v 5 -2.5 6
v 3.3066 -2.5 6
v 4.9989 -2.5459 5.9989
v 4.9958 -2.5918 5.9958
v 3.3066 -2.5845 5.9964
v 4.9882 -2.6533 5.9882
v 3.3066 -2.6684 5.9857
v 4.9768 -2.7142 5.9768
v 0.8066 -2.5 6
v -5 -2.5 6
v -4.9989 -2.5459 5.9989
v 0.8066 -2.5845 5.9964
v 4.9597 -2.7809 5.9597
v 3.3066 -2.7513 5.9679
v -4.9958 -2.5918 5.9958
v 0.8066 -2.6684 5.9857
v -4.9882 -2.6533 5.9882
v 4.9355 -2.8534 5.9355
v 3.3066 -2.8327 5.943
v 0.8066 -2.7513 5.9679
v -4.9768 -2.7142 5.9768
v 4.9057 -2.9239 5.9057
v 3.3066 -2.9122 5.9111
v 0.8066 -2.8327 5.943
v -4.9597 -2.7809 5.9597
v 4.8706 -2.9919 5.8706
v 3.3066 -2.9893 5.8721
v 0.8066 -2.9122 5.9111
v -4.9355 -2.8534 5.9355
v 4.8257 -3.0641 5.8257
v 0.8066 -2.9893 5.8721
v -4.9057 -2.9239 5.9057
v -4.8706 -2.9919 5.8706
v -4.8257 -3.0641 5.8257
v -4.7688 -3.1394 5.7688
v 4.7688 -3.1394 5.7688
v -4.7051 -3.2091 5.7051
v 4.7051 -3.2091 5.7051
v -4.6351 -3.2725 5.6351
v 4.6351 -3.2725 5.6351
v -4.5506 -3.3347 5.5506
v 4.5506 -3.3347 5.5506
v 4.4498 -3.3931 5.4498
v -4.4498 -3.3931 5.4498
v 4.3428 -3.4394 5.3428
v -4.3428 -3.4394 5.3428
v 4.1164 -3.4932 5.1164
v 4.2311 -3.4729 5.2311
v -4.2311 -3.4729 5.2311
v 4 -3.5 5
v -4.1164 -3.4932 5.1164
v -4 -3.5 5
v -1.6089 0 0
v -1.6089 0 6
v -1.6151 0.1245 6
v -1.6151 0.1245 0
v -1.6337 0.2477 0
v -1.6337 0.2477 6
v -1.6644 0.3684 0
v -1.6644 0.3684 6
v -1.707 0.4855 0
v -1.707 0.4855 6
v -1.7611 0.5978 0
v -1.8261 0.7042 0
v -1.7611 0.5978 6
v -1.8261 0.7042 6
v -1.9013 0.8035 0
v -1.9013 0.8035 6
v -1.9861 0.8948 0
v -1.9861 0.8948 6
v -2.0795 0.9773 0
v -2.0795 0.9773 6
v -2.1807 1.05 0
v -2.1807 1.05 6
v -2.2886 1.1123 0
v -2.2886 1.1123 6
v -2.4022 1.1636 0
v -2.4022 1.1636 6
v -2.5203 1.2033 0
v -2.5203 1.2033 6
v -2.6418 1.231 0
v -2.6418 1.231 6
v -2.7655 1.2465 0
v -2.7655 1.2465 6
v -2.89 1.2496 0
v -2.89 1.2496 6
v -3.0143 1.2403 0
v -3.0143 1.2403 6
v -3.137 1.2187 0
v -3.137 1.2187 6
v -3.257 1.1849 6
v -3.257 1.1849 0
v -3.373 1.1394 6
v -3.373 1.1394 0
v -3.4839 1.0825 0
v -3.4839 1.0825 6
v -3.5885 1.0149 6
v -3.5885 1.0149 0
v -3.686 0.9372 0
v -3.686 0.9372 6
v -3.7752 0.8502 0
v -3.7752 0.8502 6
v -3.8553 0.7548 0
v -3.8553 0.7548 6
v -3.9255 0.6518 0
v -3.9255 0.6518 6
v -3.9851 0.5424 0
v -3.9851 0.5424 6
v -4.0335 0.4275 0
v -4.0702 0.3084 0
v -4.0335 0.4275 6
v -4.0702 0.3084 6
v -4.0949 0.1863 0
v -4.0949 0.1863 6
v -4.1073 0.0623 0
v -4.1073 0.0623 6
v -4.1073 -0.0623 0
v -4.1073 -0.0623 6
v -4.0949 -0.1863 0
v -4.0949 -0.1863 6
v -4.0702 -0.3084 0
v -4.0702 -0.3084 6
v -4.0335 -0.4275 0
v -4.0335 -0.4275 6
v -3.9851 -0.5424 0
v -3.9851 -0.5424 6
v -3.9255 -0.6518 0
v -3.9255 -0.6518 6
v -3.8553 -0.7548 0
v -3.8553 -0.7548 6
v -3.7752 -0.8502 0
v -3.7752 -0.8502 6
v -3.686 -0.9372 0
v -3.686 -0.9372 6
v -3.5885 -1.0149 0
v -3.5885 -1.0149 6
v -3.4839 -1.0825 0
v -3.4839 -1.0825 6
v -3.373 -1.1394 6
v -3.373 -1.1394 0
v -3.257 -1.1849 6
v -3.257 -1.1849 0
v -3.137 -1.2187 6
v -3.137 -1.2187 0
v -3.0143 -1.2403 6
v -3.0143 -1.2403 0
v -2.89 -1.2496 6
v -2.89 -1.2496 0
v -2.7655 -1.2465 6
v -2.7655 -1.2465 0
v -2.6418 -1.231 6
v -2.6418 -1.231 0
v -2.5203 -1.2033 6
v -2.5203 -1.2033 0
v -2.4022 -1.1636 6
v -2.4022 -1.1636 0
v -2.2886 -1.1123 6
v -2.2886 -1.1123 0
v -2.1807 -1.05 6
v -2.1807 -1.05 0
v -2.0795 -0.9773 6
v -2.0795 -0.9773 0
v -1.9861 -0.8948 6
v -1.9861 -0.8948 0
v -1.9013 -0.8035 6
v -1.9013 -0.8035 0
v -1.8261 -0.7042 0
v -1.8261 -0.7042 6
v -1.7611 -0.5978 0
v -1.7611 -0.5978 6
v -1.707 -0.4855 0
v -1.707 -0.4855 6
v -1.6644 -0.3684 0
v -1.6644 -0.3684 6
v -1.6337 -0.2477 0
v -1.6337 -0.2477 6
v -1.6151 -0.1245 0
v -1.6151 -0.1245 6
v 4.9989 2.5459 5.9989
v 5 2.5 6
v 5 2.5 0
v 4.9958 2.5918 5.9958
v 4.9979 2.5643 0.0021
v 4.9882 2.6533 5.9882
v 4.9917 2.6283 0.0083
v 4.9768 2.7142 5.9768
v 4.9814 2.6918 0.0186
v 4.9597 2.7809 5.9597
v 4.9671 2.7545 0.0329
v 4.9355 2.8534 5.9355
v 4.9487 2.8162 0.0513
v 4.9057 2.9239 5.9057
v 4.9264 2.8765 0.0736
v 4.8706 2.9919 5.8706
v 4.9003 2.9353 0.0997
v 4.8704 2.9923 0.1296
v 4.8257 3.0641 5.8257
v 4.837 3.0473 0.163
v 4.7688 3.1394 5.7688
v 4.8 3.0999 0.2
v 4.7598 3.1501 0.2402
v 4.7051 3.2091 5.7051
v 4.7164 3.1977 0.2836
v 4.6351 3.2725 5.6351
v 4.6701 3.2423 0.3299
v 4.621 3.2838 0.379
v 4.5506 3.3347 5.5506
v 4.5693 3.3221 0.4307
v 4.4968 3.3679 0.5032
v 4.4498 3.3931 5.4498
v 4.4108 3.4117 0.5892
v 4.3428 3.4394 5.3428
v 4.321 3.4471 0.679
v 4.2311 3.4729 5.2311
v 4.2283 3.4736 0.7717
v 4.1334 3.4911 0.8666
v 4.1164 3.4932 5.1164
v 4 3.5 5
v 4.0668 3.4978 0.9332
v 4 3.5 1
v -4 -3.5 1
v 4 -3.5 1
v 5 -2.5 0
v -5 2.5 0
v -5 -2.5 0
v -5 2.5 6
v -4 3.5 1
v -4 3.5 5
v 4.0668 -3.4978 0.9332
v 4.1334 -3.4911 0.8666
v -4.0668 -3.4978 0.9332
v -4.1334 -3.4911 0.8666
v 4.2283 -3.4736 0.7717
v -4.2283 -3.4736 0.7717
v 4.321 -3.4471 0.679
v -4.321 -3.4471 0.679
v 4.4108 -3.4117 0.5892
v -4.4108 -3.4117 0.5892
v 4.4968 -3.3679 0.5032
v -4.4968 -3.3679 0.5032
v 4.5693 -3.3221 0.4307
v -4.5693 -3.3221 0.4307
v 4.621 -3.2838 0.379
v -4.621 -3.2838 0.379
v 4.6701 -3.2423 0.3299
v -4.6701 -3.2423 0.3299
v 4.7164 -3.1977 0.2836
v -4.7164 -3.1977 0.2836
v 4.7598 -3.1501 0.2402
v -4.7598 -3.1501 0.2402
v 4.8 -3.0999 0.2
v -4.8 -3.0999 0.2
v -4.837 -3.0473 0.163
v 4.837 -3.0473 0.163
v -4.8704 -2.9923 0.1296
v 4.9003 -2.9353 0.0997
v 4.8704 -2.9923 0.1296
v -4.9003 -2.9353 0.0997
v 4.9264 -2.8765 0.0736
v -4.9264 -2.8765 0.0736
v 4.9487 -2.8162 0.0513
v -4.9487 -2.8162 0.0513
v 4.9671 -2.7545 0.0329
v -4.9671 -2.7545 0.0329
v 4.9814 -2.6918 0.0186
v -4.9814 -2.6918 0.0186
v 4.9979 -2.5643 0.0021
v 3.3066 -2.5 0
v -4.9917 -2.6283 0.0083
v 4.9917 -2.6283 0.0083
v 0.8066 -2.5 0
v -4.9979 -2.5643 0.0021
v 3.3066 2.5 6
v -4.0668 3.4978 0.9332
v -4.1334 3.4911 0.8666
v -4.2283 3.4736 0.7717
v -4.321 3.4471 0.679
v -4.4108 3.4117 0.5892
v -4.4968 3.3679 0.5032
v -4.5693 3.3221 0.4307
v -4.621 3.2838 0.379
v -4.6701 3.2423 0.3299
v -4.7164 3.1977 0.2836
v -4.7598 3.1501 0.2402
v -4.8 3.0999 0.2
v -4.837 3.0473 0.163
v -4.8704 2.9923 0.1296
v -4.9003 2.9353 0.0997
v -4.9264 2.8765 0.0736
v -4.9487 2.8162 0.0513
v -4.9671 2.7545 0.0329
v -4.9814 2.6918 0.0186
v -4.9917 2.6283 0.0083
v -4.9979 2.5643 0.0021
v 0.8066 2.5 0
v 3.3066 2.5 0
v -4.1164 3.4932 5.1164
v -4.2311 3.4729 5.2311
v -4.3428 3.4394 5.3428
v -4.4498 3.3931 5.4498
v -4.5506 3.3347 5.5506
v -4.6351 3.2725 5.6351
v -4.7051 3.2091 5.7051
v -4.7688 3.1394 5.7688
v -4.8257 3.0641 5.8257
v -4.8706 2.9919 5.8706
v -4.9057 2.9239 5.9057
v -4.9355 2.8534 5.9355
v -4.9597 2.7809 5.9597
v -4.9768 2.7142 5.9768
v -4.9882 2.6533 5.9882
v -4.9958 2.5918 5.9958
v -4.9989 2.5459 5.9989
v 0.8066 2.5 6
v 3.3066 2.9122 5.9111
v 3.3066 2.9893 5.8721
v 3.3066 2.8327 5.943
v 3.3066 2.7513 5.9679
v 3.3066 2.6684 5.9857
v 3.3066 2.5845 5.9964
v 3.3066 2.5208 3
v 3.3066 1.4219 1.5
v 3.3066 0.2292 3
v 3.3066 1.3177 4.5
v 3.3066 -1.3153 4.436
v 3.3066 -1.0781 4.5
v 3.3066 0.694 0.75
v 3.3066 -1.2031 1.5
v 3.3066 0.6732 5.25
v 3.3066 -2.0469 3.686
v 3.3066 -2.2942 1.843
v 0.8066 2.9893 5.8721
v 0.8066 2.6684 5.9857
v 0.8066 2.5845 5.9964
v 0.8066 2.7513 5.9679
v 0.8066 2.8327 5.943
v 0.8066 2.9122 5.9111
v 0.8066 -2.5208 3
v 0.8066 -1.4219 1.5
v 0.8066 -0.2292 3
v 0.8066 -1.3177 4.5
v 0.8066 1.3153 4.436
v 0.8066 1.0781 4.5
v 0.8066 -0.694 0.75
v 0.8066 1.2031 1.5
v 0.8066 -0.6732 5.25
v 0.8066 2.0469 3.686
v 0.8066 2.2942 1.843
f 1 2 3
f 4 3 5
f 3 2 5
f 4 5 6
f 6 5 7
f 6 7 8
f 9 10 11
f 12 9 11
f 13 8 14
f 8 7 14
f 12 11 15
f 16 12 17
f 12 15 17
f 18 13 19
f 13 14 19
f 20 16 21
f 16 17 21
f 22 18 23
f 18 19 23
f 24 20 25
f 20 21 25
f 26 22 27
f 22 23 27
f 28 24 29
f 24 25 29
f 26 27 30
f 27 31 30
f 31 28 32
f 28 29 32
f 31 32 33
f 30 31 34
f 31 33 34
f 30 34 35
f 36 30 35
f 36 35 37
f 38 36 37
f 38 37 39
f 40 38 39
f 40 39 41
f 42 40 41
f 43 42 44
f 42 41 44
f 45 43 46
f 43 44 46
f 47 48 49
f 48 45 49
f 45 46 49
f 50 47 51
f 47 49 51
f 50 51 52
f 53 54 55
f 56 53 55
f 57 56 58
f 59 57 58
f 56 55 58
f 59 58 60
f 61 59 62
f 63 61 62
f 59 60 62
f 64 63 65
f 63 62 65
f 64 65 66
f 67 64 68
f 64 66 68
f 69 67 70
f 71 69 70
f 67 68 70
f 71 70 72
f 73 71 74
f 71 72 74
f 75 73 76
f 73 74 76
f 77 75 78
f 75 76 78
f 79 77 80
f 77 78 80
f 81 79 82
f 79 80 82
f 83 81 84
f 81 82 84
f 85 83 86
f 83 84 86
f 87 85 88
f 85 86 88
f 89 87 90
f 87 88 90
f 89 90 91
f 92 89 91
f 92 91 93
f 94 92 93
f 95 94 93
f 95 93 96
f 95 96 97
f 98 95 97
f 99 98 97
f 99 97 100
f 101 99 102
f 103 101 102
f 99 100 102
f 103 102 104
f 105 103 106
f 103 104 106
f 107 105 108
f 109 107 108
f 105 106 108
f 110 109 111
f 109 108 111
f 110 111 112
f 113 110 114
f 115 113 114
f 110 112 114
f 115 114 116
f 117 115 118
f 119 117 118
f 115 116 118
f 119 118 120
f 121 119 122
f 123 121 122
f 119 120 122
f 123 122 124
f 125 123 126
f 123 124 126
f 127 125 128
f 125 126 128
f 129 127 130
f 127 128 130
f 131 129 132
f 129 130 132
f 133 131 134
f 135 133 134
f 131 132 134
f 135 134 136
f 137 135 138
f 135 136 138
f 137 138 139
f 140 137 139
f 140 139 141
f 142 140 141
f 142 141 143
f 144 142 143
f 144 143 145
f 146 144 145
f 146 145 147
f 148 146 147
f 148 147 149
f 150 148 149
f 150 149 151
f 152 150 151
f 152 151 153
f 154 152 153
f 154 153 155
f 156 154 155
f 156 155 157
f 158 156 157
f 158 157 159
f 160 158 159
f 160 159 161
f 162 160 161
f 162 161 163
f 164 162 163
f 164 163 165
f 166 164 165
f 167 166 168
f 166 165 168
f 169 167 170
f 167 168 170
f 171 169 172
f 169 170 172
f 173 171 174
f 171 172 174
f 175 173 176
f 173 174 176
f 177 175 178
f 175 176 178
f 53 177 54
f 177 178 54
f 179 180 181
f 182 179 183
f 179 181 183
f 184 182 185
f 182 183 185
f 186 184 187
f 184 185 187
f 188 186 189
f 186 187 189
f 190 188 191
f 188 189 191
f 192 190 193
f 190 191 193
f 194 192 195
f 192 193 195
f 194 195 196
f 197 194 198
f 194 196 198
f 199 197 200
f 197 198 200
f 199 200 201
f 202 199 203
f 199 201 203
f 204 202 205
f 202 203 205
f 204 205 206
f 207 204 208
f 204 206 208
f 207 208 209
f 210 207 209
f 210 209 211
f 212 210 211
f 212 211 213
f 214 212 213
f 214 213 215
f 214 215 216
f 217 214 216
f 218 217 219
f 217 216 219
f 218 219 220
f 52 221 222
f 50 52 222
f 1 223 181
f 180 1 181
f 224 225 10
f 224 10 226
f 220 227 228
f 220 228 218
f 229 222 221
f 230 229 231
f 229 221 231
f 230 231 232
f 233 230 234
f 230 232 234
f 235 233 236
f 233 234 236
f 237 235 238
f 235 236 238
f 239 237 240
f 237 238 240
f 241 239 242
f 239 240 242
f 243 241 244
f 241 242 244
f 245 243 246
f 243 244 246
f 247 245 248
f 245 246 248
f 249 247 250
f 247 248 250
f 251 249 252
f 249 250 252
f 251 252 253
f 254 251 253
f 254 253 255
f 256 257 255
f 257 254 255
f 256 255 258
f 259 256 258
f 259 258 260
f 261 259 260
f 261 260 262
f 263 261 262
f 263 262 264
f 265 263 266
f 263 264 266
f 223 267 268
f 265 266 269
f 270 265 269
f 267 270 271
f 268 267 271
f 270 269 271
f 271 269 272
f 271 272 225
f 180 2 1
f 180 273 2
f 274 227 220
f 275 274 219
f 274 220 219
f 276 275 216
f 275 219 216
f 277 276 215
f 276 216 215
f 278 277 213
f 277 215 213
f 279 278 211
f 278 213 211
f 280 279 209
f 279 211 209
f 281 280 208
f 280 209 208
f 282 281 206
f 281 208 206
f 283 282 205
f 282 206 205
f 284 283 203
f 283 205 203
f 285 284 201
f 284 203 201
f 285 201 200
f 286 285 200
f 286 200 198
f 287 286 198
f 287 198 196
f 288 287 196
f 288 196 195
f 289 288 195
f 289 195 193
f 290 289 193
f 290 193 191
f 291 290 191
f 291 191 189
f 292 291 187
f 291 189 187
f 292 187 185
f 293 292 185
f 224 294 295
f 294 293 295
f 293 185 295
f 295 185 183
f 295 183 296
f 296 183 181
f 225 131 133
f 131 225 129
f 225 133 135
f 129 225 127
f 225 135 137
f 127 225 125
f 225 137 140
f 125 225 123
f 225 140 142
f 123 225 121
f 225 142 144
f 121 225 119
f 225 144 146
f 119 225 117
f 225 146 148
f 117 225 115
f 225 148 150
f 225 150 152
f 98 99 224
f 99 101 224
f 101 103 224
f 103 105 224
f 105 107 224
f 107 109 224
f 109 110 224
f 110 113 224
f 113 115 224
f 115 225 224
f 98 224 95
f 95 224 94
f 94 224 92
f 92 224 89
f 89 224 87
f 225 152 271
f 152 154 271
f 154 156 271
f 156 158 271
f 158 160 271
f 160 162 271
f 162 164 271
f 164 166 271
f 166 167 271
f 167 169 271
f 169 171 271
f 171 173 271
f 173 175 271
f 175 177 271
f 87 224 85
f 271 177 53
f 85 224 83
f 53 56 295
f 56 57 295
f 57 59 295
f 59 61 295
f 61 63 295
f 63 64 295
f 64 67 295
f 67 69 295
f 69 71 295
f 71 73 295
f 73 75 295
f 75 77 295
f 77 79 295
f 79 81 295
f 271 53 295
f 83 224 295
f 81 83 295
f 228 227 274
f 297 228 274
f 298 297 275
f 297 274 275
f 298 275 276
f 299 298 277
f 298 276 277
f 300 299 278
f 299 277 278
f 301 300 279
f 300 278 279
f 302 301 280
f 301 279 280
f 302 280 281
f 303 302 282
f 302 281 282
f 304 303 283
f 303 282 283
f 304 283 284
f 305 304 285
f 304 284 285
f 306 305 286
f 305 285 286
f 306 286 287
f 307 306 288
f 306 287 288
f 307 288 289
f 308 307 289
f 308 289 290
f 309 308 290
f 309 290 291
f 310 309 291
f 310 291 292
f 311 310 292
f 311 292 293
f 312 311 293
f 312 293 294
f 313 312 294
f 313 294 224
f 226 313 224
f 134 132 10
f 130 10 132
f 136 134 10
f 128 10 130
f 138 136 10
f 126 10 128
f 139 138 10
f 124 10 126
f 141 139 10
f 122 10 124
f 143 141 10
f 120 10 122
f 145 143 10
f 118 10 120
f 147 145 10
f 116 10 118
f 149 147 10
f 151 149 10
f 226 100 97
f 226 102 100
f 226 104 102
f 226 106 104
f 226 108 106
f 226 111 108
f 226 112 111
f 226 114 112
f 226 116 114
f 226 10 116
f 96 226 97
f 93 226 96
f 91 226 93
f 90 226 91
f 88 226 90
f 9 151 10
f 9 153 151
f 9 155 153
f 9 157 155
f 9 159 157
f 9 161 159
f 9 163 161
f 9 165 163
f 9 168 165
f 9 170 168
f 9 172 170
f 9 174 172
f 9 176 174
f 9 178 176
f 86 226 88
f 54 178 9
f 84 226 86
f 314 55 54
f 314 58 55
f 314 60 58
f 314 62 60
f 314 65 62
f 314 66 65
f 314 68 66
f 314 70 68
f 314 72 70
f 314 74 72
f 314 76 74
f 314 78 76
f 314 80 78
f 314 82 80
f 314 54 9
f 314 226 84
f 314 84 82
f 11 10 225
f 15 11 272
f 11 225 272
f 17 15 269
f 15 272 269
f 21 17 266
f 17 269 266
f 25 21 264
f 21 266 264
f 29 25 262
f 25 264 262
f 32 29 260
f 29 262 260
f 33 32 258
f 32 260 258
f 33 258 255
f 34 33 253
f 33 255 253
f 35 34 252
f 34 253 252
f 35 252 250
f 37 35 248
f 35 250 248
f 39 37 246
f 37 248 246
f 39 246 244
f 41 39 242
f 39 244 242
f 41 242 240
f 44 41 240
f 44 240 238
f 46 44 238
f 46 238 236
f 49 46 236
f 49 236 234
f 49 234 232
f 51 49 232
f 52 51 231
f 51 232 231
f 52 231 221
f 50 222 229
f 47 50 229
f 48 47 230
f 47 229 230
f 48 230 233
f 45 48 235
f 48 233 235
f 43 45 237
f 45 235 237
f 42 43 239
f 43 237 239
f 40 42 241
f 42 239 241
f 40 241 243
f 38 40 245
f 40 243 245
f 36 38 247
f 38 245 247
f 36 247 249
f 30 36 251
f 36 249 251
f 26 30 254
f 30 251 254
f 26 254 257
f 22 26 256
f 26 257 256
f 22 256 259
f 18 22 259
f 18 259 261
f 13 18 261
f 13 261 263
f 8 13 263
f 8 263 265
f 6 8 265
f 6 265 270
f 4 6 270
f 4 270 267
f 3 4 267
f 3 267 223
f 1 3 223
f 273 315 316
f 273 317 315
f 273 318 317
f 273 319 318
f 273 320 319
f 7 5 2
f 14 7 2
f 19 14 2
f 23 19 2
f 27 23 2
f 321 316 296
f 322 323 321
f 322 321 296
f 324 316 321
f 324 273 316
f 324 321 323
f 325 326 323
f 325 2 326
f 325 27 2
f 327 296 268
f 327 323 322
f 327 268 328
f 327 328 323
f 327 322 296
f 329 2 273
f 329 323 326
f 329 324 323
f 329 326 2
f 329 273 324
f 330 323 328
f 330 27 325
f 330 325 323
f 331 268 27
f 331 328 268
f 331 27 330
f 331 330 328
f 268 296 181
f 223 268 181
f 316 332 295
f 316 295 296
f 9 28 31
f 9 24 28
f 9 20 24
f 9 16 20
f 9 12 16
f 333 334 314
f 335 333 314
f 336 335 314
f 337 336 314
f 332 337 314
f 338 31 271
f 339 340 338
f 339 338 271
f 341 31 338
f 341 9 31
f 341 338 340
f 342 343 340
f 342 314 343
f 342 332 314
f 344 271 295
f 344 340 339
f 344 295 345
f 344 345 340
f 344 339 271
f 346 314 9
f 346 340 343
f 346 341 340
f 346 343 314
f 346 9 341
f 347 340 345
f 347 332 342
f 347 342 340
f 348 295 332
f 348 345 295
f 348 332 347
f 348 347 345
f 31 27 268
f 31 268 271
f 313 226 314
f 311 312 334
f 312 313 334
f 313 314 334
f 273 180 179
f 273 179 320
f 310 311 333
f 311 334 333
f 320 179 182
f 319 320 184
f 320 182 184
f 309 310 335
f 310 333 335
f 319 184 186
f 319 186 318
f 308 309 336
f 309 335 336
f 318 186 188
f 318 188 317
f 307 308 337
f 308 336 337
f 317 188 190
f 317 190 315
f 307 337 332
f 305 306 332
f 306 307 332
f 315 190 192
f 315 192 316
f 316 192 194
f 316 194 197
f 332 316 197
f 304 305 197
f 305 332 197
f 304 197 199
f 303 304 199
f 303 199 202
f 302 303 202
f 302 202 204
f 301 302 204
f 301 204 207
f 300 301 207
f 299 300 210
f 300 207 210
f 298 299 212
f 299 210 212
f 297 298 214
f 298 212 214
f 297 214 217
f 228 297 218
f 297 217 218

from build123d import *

# Parameters (mm, degrees)
SKETCH1_W           = 10
SKETCH1_H           = 7
BOSS_EXTRUDE1_DEPTH = 6
SKETCH4_R           = 1.25
CUT_EXTRUDE1_DEPTH  = 6
FILLET1_R           = 1


with BuildPart() as part:
    # Sketch1 → Boss-Extrude1 (new body)
    with BuildSketch(Plane.XY):
        Rectangle(SKETCH1_W, SKETCH1_H)
    extrude(amount=BOSS_EXTRUDE1_DEPTH)

    # Sketch3 → Cut-Loft2 section 0
    with BuildSketch(Plane(origin=(0, 0, 0), x_dir=(-1, 0, 0), z_dir=(0, 0, -1))):
        with BuildLine():
            Line((-3.306604223, -2.5), (-0.806604223, -2.5))
            Line((-0.806604223, -2.5), (-0.806604223, 2.5))
            Line((-0.806604223, 2.5), (-3.306604223, 2.5))
            Line((-3.306604223, 2.5), (-3.306604223, -2.5))
        make_face()
    # Sketch2 → Cut-Loft2 section 1
    with BuildSketch(Plane.XY.offset(6)):
        with BuildLine():
            Line((0.806604223, -3), (3.306604223, -3))
            Line((3.306604223, -3), (3.306604223, 3))
            Line((3.306604223, 3), (0.806604223, 3))
            Line((0.806604223, 3), (0.806604223, -3))
        make_face()
    loft(mode=Mode.SUBTRACT)

    # Sketch4 → Cut-Extrude1 (cut)
    with BuildSketch(Plane.XY.offset(6)):
        with Locations((-2.858867823, 0)):
            Circle(SKETCH4_R)
    extrude(amount=-CUT_EXTRUDE1_DEPTH, mode=Mode.SUBTRACT)

    # Fillet1
    # the kernel refuses this fillet: 1 mm, written as the material it takes off along each edge
    with BuildSketch(Plane(origin=(-7.5, -3.5, 0), x_dir=(0, 0, 1), z_dir=(1, 0, 0)), Plane(origin=(7.5, 3.5, 6), x_dir=(0, -1, 0), z_dir=(-1, 0, 0))) as fillet1_piece_1:
        with BuildLine():
            CenterArc((FILLET1_R, -FILLET1_R), FILLET1_R, 90, 90)
            Line((0, -FILLET1_R), (0, 0))
            Line((0, 0), (FILLET1_R, 0))
        make_face()
    extrude(amount=15, mode=Mode.SUBTRACT)
    with BuildSketch(Plane(origin=(7.5, 3.5, 0), x_dir=(0, -1, 0), z_dir=(-1, 0, 0)), Plane(origin=(-7.5, -3.5, 6), x_dir=(0, 0, -1), z_dir=(1, 0, 0))) as fillet1_piece_2:
        with BuildLine():
            CenterArc((FILLET1_R, FILLET1_R), FILLET1_R, 180, 90)
            Line((0, FILLET1_R), (0, 0))
            Line((0, 0), (FILLET1_R, 0))
        make_face()
    extrude(amount=15, mode=Mode.SUBTRACT)
    with BuildSketch(Plane(origin=(-5, -3.5, -2.5), x_dir=(1, 0, 0), z_dir=(0, 0, 1)), Plane(origin=(-5, 3.5, -2.5), x_dir=(0, -1, 0), z_dir=(0, 0, 1))) as fillet1_piece_3:
        with BuildLine():
            CenterArc((FILLET1_R, FILLET1_R), FILLET1_R, 180, 90)
            Line((0, FILLET1_R), (0, 0))
            Line((0, 0), (FILLET1_R, 0))
        make_face()
    extrude(amount=11, mode=Mode.SUBTRACT)
    with BuildSketch(Plane(origin=(5, -3.5, -2.5), x_dir=(-1, 0, 0), z_dir=(0, 0, 1)), Plane(origin=(5, 3.5, -2.5), x_dir=(0, -1, 0), z_dir=(0, 0, 1))) as fillet1_piece_4:
        with BuildLine():
            CenterArc((FILLET1_R, -FILLET1_R), FILLET1_R, 90, 90)
            Line((0, -FILLET1_R), (0, 0))
            Line((0, 0), (FILLET1_R, 0))
        make_face()
    extrude(amount=11, mode=Mode.SUBTRACT)


solid = part.part
